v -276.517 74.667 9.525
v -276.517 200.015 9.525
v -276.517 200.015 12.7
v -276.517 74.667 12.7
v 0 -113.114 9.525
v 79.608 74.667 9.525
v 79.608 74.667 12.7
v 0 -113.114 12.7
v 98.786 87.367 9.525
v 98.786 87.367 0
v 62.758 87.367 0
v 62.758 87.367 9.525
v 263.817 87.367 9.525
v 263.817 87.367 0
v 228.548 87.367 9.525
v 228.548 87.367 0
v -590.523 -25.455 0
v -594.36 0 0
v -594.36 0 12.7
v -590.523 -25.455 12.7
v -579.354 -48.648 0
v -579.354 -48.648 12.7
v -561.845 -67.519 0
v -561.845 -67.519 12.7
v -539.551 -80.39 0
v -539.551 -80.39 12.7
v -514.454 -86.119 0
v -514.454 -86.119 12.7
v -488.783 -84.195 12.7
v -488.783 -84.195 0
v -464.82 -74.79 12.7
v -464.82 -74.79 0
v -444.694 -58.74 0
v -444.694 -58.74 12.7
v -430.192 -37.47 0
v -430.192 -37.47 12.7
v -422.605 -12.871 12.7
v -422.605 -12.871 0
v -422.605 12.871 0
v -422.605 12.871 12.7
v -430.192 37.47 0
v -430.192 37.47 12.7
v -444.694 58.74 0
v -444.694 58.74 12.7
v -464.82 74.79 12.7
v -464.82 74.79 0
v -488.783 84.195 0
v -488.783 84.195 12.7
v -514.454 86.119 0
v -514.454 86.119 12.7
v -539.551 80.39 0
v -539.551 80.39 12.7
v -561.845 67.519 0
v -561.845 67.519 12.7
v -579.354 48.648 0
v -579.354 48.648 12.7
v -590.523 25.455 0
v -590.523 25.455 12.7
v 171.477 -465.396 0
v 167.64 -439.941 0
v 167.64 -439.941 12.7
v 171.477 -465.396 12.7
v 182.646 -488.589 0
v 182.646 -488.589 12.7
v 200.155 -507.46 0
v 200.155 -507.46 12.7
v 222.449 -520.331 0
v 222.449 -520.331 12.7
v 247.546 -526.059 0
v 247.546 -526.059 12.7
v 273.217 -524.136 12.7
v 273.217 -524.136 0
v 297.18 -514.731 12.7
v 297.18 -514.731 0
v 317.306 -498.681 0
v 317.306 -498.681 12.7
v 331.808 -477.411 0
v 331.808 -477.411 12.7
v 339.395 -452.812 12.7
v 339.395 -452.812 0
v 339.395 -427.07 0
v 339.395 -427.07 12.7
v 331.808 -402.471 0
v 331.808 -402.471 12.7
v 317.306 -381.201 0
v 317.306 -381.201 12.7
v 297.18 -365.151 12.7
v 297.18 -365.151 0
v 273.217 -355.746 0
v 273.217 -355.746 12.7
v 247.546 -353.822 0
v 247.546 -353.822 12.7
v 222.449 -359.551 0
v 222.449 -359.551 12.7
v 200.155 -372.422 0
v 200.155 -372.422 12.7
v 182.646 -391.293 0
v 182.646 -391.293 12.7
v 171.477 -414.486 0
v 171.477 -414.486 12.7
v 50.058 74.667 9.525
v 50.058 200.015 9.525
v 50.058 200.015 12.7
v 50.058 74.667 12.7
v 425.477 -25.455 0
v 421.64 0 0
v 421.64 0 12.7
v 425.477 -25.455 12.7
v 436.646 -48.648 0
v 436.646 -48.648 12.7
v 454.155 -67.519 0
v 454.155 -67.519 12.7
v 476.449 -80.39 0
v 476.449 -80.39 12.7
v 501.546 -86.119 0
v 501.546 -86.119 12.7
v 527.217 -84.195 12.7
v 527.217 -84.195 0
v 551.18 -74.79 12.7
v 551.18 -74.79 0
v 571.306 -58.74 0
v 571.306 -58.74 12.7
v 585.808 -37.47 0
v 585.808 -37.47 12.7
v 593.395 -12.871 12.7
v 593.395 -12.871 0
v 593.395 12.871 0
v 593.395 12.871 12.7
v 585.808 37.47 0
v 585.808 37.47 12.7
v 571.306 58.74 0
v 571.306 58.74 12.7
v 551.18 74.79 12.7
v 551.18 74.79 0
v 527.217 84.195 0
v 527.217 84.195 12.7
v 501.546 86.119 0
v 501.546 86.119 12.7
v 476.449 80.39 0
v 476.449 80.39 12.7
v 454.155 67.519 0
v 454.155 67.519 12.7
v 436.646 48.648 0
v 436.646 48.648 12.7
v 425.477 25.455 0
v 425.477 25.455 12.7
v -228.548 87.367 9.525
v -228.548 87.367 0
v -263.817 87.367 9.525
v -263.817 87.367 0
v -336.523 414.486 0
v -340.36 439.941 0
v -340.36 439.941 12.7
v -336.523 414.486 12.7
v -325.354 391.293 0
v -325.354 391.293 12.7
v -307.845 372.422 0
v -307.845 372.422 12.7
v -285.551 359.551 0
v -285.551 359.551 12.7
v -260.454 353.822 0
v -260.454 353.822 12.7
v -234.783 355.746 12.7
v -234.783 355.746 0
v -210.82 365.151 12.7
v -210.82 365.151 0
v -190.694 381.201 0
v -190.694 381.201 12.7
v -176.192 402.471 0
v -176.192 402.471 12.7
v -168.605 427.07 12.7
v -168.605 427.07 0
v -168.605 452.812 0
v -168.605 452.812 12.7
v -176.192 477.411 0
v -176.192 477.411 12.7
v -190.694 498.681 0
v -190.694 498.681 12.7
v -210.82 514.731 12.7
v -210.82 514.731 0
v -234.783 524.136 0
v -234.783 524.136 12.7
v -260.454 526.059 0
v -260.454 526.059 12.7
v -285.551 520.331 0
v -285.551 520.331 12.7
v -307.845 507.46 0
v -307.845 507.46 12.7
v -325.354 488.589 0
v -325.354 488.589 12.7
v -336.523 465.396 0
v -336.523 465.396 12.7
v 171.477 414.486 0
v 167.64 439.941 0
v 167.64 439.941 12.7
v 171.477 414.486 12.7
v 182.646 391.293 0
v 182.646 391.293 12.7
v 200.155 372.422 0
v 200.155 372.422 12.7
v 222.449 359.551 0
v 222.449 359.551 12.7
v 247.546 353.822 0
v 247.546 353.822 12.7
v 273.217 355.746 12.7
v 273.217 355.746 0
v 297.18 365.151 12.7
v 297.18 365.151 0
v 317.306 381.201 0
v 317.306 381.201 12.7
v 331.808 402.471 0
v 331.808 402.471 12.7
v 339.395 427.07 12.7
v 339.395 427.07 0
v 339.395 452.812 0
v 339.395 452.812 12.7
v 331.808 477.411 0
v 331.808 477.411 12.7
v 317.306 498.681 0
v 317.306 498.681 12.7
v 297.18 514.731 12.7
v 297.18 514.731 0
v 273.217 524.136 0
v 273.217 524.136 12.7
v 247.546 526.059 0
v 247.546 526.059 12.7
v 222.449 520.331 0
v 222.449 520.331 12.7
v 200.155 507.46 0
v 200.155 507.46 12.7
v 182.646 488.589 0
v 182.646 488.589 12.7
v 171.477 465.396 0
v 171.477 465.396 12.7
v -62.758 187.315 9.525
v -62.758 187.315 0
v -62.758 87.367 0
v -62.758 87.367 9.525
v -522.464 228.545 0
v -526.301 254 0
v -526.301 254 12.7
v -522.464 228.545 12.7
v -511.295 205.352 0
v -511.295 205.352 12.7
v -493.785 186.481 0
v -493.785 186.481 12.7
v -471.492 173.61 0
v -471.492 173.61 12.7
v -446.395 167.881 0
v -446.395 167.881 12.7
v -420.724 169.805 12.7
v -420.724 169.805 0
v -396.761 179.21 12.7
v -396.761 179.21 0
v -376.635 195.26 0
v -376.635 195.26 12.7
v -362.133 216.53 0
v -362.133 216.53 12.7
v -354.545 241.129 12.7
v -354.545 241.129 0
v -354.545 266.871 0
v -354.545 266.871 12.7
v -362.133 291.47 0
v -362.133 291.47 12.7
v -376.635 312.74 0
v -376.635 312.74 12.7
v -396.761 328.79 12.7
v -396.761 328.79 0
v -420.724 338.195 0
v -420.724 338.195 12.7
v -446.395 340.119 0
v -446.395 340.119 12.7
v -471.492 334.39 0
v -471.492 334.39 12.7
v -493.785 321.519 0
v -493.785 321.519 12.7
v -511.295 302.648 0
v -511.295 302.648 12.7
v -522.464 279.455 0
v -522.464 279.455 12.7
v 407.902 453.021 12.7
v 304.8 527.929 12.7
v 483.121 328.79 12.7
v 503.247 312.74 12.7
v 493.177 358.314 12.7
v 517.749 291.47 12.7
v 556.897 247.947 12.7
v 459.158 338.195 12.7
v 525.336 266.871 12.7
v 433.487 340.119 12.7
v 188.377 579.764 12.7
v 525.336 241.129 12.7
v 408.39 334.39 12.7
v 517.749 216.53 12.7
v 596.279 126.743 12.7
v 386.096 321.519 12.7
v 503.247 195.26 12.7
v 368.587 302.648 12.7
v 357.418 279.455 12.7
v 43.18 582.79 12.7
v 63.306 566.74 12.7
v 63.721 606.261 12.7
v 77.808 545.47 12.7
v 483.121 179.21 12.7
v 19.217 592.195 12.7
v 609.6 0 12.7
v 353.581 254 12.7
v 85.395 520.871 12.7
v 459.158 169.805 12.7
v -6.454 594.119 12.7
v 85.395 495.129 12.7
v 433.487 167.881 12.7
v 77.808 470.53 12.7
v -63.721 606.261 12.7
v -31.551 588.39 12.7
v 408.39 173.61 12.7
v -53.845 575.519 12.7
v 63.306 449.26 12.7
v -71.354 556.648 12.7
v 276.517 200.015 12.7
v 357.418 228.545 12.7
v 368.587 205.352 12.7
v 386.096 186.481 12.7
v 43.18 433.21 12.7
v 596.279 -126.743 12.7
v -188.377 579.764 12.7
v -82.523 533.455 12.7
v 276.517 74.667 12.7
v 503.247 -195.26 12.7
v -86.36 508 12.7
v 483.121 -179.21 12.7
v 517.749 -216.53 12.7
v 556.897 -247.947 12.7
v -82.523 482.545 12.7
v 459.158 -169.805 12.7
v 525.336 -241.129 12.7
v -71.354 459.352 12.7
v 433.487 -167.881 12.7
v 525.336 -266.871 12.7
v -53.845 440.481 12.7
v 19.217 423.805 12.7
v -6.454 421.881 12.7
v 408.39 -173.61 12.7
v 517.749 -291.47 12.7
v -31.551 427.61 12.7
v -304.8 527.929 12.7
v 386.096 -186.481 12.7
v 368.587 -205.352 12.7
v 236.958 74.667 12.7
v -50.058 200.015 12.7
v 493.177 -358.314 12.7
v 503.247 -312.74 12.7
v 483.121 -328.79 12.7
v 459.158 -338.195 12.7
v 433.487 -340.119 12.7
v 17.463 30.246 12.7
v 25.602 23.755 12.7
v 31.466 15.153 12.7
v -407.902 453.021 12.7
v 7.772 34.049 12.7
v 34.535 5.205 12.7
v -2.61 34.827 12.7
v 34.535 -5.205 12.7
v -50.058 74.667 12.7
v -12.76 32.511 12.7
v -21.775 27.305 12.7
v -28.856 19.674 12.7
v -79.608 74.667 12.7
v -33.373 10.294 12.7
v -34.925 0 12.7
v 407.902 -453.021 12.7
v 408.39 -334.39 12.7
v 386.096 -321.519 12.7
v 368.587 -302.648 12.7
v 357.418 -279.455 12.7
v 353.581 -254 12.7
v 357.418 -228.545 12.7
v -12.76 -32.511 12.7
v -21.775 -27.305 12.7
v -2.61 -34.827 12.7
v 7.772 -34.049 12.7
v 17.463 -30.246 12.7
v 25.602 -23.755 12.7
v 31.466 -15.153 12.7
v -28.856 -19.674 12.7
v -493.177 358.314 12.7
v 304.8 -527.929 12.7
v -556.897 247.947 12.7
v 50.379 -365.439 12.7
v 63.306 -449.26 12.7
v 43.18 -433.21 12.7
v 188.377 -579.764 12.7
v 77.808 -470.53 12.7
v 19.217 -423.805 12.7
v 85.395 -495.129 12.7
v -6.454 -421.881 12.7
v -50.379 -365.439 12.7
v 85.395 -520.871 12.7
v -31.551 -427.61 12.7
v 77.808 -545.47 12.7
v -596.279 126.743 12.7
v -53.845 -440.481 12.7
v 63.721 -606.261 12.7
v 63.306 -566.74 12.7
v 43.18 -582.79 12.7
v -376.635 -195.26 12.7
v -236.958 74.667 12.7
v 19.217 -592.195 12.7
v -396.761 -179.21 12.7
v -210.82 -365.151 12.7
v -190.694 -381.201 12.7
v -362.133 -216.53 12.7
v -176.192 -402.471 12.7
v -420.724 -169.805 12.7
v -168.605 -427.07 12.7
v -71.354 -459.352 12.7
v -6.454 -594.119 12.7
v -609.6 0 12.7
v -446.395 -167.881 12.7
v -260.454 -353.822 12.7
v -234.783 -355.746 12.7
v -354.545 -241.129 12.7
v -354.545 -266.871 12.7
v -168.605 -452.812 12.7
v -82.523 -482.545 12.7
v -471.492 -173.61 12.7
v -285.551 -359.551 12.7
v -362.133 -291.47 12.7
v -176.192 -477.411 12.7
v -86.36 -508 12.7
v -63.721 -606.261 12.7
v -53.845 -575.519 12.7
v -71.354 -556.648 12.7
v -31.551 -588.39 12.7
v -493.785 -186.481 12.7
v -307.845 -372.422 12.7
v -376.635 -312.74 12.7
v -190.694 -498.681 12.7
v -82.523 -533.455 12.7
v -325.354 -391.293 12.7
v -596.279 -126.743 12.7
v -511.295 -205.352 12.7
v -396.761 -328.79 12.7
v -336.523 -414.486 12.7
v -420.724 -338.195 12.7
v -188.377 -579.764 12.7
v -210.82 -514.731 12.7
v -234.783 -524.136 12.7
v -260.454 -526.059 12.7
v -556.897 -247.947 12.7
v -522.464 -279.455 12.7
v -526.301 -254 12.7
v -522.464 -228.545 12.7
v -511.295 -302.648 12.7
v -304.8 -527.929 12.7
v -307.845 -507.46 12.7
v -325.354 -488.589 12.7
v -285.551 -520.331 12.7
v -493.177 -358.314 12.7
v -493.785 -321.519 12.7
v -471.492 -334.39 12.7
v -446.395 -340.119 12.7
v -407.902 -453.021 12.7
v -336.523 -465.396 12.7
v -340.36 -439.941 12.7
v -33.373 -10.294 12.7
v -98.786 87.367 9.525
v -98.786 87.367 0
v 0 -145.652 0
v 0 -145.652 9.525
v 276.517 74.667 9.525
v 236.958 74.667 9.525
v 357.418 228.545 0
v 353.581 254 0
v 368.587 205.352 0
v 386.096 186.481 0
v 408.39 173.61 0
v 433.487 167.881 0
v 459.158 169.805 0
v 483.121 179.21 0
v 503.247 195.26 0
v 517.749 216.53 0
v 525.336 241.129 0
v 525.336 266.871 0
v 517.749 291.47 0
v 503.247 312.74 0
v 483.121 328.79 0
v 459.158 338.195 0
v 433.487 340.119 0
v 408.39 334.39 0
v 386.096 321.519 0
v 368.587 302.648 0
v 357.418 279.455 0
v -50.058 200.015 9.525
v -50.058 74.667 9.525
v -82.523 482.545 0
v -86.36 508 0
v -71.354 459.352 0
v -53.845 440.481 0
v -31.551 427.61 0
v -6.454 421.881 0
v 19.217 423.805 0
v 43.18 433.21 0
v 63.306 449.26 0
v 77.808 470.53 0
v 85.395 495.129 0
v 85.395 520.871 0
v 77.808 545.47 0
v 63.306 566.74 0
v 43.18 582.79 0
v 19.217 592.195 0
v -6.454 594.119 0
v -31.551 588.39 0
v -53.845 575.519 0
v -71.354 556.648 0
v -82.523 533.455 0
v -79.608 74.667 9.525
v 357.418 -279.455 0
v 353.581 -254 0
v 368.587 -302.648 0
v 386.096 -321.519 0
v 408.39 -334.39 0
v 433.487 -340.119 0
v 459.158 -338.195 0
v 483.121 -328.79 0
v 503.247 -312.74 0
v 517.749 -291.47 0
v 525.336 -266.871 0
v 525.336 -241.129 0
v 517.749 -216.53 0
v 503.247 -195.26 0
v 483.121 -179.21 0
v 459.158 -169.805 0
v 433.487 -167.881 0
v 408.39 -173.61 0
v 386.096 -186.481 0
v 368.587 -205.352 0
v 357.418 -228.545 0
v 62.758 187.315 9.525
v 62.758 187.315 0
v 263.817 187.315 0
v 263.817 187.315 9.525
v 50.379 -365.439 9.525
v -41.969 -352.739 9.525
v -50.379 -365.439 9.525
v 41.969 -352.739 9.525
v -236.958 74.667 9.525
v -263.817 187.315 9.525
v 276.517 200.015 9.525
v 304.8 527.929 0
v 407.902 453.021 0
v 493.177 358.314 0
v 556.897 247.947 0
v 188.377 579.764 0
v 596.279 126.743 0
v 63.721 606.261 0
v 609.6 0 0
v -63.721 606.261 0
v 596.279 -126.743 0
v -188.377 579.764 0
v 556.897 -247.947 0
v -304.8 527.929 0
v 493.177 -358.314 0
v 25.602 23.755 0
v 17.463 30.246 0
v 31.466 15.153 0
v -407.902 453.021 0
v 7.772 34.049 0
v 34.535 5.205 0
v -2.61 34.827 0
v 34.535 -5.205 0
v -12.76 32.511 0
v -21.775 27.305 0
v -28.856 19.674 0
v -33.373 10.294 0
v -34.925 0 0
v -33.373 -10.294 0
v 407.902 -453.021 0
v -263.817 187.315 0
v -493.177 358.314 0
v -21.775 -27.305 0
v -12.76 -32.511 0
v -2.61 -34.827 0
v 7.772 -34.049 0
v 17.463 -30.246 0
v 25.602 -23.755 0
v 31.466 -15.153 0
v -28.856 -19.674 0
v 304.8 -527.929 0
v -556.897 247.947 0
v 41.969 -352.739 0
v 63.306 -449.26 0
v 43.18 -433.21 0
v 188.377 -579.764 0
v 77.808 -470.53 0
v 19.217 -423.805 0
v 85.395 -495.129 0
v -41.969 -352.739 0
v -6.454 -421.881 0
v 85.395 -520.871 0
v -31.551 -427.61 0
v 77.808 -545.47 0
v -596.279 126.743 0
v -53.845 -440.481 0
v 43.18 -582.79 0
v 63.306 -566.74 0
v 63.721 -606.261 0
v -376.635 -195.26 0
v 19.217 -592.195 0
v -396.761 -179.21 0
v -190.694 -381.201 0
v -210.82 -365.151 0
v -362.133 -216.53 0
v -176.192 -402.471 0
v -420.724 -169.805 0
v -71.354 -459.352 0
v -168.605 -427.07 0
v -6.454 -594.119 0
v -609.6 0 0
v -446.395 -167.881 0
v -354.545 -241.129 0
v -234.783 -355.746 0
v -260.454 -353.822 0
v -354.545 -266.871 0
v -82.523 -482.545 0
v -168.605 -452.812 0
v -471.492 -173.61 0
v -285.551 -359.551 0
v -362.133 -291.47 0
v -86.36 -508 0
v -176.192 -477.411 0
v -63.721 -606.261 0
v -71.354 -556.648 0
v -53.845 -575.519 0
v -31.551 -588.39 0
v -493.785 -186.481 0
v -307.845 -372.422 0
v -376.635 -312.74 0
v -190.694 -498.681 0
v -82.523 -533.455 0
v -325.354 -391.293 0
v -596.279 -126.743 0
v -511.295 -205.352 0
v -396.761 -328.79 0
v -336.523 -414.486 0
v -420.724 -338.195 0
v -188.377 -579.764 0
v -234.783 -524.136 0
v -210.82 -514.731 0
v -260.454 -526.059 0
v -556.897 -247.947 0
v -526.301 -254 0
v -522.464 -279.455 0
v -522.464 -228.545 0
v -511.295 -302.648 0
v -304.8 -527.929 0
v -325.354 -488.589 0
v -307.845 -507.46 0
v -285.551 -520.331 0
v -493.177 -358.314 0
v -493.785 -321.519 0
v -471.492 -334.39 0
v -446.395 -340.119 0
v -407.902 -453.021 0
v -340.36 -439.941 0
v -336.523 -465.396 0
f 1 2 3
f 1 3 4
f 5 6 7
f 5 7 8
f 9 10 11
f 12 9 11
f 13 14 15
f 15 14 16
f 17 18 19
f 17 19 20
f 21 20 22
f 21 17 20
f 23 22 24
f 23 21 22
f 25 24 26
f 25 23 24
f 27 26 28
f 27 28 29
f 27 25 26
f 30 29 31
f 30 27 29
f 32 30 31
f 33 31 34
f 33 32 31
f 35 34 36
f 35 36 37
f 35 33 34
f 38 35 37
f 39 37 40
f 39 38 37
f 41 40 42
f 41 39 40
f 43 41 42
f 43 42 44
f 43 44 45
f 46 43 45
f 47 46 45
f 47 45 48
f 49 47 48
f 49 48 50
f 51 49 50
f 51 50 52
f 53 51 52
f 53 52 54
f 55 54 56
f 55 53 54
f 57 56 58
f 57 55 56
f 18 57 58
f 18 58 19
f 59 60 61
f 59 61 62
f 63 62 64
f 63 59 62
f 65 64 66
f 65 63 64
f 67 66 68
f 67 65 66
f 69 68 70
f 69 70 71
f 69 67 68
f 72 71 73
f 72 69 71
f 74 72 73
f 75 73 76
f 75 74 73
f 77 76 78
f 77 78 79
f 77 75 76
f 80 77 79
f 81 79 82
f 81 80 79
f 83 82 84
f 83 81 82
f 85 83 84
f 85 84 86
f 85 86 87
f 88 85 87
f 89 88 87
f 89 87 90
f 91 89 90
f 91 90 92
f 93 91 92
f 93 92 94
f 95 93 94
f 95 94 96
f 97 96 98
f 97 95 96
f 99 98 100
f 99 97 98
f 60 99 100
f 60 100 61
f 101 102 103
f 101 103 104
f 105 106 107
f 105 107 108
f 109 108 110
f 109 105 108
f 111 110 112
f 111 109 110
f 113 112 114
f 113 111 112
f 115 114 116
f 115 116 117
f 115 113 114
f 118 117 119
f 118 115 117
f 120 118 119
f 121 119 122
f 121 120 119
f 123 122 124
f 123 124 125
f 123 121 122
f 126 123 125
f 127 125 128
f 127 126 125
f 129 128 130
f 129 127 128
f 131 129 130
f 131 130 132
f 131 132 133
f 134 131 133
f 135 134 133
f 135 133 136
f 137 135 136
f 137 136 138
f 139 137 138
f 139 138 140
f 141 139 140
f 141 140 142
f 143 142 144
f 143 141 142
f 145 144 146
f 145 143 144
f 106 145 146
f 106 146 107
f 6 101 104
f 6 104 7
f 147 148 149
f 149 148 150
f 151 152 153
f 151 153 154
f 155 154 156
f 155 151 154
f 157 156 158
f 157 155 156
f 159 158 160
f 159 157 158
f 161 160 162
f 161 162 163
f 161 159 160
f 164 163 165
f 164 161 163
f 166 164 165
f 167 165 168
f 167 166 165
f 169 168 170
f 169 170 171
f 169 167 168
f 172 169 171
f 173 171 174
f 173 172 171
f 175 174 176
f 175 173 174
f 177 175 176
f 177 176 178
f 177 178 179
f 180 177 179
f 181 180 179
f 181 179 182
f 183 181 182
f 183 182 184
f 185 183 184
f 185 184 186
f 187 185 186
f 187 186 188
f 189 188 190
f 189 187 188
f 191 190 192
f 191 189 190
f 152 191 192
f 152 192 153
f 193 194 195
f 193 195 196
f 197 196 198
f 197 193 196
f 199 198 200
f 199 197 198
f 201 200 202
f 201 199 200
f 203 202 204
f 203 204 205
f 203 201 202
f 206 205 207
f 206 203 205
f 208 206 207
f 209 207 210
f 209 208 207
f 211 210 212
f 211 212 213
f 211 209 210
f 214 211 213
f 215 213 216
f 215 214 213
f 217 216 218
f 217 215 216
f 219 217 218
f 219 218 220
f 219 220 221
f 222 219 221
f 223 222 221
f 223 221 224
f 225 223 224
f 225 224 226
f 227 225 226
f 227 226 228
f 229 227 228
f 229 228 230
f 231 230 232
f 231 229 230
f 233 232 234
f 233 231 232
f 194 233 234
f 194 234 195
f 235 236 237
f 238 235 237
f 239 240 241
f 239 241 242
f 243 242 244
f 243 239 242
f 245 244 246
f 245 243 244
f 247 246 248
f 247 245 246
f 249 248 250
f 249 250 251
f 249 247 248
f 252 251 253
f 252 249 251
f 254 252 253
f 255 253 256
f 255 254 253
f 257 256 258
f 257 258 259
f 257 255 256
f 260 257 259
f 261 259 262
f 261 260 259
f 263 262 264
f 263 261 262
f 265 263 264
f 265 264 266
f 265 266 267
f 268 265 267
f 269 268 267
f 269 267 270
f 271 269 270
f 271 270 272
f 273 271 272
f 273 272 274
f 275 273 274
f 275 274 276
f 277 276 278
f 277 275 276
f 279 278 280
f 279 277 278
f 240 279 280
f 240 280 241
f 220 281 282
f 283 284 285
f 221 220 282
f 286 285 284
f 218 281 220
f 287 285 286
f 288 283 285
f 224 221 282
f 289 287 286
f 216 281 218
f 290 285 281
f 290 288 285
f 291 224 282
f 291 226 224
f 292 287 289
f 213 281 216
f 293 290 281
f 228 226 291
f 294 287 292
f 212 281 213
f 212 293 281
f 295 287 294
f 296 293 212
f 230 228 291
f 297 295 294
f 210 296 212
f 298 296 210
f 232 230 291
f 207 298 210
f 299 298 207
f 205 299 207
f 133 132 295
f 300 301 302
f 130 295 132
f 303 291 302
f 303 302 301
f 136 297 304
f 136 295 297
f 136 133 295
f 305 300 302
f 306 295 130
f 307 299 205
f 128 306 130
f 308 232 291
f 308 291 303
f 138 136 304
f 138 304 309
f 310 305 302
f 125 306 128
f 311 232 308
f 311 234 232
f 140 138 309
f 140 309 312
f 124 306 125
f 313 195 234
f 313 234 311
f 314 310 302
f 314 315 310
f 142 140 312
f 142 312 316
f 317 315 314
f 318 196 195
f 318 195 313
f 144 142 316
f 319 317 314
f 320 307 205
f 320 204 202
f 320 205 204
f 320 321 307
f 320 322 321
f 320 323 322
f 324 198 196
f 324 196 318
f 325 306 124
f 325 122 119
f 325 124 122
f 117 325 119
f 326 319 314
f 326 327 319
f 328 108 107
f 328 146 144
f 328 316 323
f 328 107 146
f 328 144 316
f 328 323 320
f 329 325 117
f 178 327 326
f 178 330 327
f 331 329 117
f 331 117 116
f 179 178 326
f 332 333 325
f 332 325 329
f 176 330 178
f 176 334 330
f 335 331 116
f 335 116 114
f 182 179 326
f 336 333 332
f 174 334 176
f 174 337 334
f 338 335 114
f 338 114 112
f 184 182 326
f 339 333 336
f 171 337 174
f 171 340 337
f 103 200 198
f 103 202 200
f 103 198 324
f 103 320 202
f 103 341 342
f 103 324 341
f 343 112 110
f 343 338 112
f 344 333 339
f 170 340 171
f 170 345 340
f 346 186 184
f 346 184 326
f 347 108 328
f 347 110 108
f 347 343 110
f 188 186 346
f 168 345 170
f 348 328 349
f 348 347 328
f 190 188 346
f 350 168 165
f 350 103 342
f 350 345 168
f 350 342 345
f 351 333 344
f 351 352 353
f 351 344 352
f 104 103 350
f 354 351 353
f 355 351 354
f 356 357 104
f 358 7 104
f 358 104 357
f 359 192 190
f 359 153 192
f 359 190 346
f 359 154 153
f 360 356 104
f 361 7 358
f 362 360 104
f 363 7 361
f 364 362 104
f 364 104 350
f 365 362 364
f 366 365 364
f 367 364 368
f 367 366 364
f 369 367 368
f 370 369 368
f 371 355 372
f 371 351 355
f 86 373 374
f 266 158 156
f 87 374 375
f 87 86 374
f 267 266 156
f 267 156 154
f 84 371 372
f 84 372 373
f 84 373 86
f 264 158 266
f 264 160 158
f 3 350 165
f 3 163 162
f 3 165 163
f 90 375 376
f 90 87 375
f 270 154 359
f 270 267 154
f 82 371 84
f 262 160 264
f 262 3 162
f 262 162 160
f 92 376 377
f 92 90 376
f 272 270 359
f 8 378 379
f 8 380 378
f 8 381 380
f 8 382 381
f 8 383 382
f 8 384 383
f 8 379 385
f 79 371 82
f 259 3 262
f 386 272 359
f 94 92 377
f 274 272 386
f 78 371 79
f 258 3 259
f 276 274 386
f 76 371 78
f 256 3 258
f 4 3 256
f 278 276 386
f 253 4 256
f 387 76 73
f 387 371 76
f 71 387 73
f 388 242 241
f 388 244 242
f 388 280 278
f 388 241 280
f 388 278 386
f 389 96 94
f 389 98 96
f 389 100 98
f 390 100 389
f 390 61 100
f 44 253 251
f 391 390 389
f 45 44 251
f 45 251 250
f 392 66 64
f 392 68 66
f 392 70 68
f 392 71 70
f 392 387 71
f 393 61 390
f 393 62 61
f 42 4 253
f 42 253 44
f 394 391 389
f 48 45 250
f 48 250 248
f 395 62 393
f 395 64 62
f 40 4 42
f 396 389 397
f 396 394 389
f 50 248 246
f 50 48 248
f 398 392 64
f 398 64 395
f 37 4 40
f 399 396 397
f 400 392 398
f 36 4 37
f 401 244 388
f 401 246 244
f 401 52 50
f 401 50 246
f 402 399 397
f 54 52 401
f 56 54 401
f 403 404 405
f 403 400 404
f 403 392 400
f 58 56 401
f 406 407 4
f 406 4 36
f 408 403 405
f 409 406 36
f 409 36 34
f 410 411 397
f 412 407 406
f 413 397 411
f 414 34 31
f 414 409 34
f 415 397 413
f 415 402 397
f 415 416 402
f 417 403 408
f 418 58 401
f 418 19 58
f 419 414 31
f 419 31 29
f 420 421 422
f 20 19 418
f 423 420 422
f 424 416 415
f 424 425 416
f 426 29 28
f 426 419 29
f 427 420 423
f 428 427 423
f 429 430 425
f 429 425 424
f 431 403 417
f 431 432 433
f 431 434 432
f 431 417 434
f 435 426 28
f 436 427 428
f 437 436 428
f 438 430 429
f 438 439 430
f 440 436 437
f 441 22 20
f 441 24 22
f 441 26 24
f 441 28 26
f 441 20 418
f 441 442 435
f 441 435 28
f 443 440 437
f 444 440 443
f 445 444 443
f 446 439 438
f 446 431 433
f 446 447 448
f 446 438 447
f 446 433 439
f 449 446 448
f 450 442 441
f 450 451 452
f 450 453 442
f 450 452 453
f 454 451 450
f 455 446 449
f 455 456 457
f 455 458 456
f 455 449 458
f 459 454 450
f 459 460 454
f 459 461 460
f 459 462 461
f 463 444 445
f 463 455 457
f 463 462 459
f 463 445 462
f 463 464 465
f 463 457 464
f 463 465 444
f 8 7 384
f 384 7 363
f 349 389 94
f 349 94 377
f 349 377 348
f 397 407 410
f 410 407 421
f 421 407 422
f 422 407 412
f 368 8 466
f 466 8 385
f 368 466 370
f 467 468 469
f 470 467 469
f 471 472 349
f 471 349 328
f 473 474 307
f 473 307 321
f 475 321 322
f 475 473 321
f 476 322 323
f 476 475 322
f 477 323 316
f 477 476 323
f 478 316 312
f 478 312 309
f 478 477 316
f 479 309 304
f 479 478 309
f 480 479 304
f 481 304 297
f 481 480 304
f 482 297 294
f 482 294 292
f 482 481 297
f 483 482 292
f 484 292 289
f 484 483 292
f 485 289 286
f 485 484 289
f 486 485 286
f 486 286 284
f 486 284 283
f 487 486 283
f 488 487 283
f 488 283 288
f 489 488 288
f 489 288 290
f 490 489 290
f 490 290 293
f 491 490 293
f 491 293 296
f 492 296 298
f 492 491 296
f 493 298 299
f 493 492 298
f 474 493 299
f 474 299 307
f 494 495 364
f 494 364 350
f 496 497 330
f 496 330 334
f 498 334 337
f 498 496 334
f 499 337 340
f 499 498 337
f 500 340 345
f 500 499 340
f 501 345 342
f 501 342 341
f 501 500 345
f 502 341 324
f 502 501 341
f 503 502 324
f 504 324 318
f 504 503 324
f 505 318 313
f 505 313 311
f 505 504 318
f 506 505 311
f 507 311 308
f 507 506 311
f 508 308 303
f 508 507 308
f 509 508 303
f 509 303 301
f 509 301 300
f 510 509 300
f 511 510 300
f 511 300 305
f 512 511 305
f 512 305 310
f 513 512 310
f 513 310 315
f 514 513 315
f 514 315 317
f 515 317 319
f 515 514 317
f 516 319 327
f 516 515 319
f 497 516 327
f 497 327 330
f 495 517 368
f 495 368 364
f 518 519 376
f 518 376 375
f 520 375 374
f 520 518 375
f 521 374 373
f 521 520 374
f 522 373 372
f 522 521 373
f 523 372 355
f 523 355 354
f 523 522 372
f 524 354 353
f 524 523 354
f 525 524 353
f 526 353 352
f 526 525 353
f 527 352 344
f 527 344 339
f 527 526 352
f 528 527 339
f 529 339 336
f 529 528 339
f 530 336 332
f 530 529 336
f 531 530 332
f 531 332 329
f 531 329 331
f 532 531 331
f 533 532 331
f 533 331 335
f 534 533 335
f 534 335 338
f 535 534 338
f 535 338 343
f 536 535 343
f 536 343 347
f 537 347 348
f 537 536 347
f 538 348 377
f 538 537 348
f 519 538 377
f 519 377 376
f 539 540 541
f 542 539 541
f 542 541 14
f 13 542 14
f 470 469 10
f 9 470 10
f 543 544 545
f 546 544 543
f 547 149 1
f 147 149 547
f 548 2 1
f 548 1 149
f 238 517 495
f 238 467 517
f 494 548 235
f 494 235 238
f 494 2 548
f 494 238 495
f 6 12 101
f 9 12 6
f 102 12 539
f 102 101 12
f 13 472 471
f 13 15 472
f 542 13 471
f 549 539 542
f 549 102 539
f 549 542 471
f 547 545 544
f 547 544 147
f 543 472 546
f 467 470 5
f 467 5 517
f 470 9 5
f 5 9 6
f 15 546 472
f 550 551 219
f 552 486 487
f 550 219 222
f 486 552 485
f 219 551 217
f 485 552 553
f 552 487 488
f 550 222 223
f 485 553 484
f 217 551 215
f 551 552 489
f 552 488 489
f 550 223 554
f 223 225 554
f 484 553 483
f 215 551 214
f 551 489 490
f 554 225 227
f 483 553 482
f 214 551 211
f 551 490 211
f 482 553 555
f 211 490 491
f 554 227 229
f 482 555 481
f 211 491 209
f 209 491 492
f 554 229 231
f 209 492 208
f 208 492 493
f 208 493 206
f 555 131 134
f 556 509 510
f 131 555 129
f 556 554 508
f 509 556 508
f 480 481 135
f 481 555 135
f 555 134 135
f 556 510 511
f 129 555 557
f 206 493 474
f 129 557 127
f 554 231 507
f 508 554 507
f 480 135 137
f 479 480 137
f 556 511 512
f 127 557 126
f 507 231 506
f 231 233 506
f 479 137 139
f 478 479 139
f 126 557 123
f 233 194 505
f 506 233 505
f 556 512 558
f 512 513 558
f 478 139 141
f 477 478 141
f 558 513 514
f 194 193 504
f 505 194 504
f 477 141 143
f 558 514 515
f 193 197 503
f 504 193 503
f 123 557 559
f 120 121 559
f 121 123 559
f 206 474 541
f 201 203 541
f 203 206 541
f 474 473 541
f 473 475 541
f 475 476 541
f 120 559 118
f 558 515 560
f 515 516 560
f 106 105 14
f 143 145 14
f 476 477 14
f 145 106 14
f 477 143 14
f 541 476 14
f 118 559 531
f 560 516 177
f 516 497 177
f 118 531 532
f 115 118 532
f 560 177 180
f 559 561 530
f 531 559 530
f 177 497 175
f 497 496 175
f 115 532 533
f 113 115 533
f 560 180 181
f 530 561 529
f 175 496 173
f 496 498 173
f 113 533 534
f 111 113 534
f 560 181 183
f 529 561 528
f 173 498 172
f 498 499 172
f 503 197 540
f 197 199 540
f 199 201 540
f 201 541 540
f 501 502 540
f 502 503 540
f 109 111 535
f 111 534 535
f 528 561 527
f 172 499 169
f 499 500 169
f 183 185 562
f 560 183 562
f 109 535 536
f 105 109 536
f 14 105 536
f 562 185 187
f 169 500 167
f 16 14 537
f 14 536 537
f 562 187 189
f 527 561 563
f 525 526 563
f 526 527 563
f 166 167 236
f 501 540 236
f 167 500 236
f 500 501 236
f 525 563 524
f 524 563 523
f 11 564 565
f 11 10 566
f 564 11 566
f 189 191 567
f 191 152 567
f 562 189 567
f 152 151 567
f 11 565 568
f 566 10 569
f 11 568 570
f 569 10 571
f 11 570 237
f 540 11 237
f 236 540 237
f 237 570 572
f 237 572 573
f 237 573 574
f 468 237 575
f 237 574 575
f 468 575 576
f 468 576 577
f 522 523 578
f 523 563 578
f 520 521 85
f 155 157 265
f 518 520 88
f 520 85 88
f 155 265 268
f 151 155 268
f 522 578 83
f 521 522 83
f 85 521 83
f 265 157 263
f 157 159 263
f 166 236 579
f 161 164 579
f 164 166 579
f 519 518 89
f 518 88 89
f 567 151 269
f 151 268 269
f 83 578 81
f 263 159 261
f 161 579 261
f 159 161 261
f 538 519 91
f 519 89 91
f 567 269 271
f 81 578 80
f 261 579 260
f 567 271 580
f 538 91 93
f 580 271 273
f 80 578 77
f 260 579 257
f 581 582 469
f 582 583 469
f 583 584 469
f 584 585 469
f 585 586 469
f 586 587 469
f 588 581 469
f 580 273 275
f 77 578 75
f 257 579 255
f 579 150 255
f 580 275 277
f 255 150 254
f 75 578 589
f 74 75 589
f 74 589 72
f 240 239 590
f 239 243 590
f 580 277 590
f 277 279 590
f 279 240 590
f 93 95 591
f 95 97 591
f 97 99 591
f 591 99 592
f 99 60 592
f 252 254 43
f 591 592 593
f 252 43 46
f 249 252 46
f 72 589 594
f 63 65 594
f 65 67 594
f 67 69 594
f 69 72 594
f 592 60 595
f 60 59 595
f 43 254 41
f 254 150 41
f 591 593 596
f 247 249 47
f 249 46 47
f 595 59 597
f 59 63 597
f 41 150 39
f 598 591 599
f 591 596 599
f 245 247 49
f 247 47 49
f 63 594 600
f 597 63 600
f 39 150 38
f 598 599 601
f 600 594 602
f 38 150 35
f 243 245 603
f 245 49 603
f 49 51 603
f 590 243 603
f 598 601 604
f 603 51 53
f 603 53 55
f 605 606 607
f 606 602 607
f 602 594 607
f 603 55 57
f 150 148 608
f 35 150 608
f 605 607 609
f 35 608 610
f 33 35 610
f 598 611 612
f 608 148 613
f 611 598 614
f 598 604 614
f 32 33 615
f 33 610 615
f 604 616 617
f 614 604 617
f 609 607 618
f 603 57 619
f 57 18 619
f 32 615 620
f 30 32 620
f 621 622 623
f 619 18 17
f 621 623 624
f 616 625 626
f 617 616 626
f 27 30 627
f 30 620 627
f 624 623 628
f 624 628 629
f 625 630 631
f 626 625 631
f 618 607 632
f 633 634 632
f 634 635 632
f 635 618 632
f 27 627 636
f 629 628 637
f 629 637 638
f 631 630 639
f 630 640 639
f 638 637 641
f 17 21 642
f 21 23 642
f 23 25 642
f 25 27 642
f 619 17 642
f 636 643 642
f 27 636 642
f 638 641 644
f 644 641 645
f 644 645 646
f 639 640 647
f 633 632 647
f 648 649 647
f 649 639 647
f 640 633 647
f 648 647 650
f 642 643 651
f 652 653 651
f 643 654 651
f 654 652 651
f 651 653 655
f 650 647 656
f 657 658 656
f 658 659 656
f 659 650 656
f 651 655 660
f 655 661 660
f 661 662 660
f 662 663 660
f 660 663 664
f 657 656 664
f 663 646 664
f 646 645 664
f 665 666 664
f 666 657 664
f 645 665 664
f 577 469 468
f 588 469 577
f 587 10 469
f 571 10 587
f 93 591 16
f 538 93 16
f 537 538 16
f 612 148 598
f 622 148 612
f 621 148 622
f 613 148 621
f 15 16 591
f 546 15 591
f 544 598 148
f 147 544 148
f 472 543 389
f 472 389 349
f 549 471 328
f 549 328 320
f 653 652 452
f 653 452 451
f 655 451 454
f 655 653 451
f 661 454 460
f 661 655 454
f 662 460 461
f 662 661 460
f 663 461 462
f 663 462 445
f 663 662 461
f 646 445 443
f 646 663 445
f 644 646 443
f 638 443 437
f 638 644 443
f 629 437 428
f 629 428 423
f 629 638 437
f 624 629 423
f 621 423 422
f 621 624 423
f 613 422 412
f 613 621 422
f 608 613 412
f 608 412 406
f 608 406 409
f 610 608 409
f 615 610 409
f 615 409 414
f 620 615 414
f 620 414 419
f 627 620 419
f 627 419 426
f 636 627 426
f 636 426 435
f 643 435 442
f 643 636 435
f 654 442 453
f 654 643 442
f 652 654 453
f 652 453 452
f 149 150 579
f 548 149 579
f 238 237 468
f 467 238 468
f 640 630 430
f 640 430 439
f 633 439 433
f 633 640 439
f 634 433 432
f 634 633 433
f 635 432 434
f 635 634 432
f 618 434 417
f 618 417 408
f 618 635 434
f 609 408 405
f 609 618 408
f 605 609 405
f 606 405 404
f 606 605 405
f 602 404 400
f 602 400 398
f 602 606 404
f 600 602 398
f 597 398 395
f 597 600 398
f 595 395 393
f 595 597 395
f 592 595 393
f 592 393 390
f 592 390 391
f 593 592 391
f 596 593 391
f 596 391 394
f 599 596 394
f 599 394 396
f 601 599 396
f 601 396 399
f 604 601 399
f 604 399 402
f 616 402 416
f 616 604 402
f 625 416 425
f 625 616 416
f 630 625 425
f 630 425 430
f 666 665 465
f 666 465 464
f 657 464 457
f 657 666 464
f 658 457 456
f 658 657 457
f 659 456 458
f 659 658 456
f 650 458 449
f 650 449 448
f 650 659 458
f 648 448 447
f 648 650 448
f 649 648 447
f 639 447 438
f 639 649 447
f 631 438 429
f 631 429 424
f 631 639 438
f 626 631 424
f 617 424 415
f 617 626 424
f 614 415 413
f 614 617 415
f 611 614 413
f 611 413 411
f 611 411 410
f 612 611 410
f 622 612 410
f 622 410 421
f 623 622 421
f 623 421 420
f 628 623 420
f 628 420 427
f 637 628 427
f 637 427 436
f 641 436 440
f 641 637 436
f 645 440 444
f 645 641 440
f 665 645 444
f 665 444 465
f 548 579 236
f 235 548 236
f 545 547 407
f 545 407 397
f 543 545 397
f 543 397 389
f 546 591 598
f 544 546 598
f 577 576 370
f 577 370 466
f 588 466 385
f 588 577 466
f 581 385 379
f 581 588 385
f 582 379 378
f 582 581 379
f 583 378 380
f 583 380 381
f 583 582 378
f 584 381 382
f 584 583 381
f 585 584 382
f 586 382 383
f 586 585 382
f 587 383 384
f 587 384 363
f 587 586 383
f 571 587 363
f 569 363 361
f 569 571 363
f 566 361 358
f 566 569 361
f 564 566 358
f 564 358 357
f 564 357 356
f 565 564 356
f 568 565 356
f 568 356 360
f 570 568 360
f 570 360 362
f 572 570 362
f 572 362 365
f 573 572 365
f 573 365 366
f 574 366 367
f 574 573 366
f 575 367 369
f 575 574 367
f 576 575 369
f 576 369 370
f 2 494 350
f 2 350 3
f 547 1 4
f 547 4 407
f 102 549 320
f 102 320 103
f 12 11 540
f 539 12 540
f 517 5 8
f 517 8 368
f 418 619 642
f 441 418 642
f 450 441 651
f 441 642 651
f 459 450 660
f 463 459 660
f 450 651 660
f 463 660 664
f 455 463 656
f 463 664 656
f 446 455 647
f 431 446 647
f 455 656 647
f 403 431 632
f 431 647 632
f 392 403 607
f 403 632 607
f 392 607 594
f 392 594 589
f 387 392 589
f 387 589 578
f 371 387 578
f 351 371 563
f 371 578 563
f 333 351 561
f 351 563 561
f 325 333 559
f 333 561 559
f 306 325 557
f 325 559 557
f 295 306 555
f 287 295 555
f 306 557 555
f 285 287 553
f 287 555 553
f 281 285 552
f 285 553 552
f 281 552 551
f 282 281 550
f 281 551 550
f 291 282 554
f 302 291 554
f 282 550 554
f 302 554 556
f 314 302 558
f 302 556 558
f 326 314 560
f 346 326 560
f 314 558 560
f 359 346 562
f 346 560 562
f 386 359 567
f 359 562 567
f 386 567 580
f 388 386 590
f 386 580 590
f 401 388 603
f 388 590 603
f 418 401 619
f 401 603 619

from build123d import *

# Parameters (mm, degrees)
SKETCH1_R               = 609.6
SKETCH1_R_2             = 86.36
SKETCH1_R_3             = 34.925
BOSS_EXTRUDE1_DEPTH     = 12.7
CUT_EXTRUDE1_DEPTH      = 863.198126883
CUT_EXTRUDE1_DEPTH_BACK = 3.175


with BuildPart() as part:
    # Sketch1 → Boss-Extrude1 (new body)
    with BuildSketch(Plane.XY):
        with Locations(Location((0, 0, 0), (0, 0, 180))):
            Circle(SKETCH1_R)
        with Locations(Location((0, 508, 0), (0, 0, 180))):
            Circle(SKETCH1_R_2, mode=Mode.SUBTRACT)
        with Locations(Location((254, 439.940905122, 0), (0, 0, 180))):
            Circle(SKETCH1_R_2, mode=Mode.SUBTRACT)
        with Locations(Location((439.940905123, 254, 0), (0, 0, 180))):
            Circle(SKETCH1_R_2, mode=Mode.SUBTRACT)
        with Locations(Location((508, 0, 0), (0, 0, 180))):
            Circle(SKETCH1_R_2, mode=Mode.SUBTRACT)
        with Locations(Location((439.940905123, -254, 0), (0, 0, 180))):
            Circle(SKETCH1_R_2, mode=Mode.SUBTRACT)
        with Locations(Location((254, -439.940905122, 0), (0, 0, 180))):
            Circle(SKETCH1_R_2, mode=Mode.SUBTRACT)
        with Locations(Location((0, -508, 0), (0, 0, 180))):
            Circle(SKETCH1_R_2, mode=Mode.SUBTRACT)
        with Locations(Location((-254, -439.940905123, 0), (0, 0, 180))):
            Circle(SKETCH1_R_2, mode=Mode.SUBTRACT)
        with Locations(Location((-439.940905122, -254, 0), (0, 0, 180))):
            Circle(SKETCH1_R_2, mode=Mode.SUBTRACT)
        with Locations(Location((-508, 0, 0), (0, 0, 180))):
            Circle(SKETCH1_R_2, mode=Mode.SUBTRACT)
        with Locations(Location((-439.940905122, 254, 0), (0, 0, 180))):
            Circle(SKETCH1_R_2, mode=Mode.SUBTRACT)
        with Locations(Location((-254, 439.940905122, 0), (0, 0, 180))):
            Circle(SKETCH1_R_2, mode=Mode.SUBTRACT)
        with Locations(Location((0, 0, 0), (0, 0, 180))):
            Circle(SKETCH1_R_3, mode=Mode.SUBTRACT)
        Polygon((-263.817141205, 187.315483827), (-62.758262665, 187.315483827), (-62.758262665, 87.367139582), (-98.786154196, 87.367139582), (0, -145.651965314), (98.786154196, 87.367139582), (62.758262665, 87.367139582), (62.758262665, 187.315483827), (263.817141205, 187.315483827), (263.817141205, 87.367139582), (228.547895375, 87.367139582), (41.969279032, -352.738890732), (-41.969279032, -352.738890732), (-228.547895375, 87.367139582), (-263.817141205, 87.367139582), align=None, mode=Mode.SUBTRACT)
    extrude(amount=BOSS_EXTRUDE1_DEPTH)

    # Sketch2 → Cut-Extrude1 (cut, two sides: drawn at the far end of the back side and taken through both)
    with BuildSketch(Plane.XY.offset(12.7).offset(-CUT_EXTRUDE1_DEPTH_BACK)):
        Polygon((50.058262665, 74.667139582), (79.607989254, 74.667139582), (0, -113.1140586), (-79.607989254, 74.667139582), (-50.058262665, 74.667139582), (-50.058262665, 200.015483827), (-276.517141205, 200.015483827), (-276.517141205, 74.667139582), (-236.957980515, 74.667139582), (-50.379364172, -365.438890732), (50.379364172, -365.438890732), (236.957980515, 74.667139582), (276.517141205, 74.667139582), (276.517141205, 200.015483827), (50.058262665, 200.015483827), align=None)
        Polygon((-41.969279032, -352.738890732), (-228.547895375, 87.367139582), (-263.817141205, 87.367139582), (-263.817141205, 187.315483827), (-62.758262665, 187.315483827), (-62.758262665, 87.367139582), (-98.786154196, 87.367139582), (0, -145.651965314), (98.786154196, 87.367139582), (62.758262665, 87.367139582), (62.758262665, 187.315483827), (263.817141205, 187.315483827), (263.817141205, 87.367139582), (228.547895375, 87.367139582), (41.969279032, -352.738890732), align=None, mode=Mode.SUBTRACT)
    extrude(amount=CUT_EXTRUDE1_DEPTH + CUT_EXTRUDE1_DEPTH_BACK, mode=Mode.SUBTRACT)


solid = part.part
